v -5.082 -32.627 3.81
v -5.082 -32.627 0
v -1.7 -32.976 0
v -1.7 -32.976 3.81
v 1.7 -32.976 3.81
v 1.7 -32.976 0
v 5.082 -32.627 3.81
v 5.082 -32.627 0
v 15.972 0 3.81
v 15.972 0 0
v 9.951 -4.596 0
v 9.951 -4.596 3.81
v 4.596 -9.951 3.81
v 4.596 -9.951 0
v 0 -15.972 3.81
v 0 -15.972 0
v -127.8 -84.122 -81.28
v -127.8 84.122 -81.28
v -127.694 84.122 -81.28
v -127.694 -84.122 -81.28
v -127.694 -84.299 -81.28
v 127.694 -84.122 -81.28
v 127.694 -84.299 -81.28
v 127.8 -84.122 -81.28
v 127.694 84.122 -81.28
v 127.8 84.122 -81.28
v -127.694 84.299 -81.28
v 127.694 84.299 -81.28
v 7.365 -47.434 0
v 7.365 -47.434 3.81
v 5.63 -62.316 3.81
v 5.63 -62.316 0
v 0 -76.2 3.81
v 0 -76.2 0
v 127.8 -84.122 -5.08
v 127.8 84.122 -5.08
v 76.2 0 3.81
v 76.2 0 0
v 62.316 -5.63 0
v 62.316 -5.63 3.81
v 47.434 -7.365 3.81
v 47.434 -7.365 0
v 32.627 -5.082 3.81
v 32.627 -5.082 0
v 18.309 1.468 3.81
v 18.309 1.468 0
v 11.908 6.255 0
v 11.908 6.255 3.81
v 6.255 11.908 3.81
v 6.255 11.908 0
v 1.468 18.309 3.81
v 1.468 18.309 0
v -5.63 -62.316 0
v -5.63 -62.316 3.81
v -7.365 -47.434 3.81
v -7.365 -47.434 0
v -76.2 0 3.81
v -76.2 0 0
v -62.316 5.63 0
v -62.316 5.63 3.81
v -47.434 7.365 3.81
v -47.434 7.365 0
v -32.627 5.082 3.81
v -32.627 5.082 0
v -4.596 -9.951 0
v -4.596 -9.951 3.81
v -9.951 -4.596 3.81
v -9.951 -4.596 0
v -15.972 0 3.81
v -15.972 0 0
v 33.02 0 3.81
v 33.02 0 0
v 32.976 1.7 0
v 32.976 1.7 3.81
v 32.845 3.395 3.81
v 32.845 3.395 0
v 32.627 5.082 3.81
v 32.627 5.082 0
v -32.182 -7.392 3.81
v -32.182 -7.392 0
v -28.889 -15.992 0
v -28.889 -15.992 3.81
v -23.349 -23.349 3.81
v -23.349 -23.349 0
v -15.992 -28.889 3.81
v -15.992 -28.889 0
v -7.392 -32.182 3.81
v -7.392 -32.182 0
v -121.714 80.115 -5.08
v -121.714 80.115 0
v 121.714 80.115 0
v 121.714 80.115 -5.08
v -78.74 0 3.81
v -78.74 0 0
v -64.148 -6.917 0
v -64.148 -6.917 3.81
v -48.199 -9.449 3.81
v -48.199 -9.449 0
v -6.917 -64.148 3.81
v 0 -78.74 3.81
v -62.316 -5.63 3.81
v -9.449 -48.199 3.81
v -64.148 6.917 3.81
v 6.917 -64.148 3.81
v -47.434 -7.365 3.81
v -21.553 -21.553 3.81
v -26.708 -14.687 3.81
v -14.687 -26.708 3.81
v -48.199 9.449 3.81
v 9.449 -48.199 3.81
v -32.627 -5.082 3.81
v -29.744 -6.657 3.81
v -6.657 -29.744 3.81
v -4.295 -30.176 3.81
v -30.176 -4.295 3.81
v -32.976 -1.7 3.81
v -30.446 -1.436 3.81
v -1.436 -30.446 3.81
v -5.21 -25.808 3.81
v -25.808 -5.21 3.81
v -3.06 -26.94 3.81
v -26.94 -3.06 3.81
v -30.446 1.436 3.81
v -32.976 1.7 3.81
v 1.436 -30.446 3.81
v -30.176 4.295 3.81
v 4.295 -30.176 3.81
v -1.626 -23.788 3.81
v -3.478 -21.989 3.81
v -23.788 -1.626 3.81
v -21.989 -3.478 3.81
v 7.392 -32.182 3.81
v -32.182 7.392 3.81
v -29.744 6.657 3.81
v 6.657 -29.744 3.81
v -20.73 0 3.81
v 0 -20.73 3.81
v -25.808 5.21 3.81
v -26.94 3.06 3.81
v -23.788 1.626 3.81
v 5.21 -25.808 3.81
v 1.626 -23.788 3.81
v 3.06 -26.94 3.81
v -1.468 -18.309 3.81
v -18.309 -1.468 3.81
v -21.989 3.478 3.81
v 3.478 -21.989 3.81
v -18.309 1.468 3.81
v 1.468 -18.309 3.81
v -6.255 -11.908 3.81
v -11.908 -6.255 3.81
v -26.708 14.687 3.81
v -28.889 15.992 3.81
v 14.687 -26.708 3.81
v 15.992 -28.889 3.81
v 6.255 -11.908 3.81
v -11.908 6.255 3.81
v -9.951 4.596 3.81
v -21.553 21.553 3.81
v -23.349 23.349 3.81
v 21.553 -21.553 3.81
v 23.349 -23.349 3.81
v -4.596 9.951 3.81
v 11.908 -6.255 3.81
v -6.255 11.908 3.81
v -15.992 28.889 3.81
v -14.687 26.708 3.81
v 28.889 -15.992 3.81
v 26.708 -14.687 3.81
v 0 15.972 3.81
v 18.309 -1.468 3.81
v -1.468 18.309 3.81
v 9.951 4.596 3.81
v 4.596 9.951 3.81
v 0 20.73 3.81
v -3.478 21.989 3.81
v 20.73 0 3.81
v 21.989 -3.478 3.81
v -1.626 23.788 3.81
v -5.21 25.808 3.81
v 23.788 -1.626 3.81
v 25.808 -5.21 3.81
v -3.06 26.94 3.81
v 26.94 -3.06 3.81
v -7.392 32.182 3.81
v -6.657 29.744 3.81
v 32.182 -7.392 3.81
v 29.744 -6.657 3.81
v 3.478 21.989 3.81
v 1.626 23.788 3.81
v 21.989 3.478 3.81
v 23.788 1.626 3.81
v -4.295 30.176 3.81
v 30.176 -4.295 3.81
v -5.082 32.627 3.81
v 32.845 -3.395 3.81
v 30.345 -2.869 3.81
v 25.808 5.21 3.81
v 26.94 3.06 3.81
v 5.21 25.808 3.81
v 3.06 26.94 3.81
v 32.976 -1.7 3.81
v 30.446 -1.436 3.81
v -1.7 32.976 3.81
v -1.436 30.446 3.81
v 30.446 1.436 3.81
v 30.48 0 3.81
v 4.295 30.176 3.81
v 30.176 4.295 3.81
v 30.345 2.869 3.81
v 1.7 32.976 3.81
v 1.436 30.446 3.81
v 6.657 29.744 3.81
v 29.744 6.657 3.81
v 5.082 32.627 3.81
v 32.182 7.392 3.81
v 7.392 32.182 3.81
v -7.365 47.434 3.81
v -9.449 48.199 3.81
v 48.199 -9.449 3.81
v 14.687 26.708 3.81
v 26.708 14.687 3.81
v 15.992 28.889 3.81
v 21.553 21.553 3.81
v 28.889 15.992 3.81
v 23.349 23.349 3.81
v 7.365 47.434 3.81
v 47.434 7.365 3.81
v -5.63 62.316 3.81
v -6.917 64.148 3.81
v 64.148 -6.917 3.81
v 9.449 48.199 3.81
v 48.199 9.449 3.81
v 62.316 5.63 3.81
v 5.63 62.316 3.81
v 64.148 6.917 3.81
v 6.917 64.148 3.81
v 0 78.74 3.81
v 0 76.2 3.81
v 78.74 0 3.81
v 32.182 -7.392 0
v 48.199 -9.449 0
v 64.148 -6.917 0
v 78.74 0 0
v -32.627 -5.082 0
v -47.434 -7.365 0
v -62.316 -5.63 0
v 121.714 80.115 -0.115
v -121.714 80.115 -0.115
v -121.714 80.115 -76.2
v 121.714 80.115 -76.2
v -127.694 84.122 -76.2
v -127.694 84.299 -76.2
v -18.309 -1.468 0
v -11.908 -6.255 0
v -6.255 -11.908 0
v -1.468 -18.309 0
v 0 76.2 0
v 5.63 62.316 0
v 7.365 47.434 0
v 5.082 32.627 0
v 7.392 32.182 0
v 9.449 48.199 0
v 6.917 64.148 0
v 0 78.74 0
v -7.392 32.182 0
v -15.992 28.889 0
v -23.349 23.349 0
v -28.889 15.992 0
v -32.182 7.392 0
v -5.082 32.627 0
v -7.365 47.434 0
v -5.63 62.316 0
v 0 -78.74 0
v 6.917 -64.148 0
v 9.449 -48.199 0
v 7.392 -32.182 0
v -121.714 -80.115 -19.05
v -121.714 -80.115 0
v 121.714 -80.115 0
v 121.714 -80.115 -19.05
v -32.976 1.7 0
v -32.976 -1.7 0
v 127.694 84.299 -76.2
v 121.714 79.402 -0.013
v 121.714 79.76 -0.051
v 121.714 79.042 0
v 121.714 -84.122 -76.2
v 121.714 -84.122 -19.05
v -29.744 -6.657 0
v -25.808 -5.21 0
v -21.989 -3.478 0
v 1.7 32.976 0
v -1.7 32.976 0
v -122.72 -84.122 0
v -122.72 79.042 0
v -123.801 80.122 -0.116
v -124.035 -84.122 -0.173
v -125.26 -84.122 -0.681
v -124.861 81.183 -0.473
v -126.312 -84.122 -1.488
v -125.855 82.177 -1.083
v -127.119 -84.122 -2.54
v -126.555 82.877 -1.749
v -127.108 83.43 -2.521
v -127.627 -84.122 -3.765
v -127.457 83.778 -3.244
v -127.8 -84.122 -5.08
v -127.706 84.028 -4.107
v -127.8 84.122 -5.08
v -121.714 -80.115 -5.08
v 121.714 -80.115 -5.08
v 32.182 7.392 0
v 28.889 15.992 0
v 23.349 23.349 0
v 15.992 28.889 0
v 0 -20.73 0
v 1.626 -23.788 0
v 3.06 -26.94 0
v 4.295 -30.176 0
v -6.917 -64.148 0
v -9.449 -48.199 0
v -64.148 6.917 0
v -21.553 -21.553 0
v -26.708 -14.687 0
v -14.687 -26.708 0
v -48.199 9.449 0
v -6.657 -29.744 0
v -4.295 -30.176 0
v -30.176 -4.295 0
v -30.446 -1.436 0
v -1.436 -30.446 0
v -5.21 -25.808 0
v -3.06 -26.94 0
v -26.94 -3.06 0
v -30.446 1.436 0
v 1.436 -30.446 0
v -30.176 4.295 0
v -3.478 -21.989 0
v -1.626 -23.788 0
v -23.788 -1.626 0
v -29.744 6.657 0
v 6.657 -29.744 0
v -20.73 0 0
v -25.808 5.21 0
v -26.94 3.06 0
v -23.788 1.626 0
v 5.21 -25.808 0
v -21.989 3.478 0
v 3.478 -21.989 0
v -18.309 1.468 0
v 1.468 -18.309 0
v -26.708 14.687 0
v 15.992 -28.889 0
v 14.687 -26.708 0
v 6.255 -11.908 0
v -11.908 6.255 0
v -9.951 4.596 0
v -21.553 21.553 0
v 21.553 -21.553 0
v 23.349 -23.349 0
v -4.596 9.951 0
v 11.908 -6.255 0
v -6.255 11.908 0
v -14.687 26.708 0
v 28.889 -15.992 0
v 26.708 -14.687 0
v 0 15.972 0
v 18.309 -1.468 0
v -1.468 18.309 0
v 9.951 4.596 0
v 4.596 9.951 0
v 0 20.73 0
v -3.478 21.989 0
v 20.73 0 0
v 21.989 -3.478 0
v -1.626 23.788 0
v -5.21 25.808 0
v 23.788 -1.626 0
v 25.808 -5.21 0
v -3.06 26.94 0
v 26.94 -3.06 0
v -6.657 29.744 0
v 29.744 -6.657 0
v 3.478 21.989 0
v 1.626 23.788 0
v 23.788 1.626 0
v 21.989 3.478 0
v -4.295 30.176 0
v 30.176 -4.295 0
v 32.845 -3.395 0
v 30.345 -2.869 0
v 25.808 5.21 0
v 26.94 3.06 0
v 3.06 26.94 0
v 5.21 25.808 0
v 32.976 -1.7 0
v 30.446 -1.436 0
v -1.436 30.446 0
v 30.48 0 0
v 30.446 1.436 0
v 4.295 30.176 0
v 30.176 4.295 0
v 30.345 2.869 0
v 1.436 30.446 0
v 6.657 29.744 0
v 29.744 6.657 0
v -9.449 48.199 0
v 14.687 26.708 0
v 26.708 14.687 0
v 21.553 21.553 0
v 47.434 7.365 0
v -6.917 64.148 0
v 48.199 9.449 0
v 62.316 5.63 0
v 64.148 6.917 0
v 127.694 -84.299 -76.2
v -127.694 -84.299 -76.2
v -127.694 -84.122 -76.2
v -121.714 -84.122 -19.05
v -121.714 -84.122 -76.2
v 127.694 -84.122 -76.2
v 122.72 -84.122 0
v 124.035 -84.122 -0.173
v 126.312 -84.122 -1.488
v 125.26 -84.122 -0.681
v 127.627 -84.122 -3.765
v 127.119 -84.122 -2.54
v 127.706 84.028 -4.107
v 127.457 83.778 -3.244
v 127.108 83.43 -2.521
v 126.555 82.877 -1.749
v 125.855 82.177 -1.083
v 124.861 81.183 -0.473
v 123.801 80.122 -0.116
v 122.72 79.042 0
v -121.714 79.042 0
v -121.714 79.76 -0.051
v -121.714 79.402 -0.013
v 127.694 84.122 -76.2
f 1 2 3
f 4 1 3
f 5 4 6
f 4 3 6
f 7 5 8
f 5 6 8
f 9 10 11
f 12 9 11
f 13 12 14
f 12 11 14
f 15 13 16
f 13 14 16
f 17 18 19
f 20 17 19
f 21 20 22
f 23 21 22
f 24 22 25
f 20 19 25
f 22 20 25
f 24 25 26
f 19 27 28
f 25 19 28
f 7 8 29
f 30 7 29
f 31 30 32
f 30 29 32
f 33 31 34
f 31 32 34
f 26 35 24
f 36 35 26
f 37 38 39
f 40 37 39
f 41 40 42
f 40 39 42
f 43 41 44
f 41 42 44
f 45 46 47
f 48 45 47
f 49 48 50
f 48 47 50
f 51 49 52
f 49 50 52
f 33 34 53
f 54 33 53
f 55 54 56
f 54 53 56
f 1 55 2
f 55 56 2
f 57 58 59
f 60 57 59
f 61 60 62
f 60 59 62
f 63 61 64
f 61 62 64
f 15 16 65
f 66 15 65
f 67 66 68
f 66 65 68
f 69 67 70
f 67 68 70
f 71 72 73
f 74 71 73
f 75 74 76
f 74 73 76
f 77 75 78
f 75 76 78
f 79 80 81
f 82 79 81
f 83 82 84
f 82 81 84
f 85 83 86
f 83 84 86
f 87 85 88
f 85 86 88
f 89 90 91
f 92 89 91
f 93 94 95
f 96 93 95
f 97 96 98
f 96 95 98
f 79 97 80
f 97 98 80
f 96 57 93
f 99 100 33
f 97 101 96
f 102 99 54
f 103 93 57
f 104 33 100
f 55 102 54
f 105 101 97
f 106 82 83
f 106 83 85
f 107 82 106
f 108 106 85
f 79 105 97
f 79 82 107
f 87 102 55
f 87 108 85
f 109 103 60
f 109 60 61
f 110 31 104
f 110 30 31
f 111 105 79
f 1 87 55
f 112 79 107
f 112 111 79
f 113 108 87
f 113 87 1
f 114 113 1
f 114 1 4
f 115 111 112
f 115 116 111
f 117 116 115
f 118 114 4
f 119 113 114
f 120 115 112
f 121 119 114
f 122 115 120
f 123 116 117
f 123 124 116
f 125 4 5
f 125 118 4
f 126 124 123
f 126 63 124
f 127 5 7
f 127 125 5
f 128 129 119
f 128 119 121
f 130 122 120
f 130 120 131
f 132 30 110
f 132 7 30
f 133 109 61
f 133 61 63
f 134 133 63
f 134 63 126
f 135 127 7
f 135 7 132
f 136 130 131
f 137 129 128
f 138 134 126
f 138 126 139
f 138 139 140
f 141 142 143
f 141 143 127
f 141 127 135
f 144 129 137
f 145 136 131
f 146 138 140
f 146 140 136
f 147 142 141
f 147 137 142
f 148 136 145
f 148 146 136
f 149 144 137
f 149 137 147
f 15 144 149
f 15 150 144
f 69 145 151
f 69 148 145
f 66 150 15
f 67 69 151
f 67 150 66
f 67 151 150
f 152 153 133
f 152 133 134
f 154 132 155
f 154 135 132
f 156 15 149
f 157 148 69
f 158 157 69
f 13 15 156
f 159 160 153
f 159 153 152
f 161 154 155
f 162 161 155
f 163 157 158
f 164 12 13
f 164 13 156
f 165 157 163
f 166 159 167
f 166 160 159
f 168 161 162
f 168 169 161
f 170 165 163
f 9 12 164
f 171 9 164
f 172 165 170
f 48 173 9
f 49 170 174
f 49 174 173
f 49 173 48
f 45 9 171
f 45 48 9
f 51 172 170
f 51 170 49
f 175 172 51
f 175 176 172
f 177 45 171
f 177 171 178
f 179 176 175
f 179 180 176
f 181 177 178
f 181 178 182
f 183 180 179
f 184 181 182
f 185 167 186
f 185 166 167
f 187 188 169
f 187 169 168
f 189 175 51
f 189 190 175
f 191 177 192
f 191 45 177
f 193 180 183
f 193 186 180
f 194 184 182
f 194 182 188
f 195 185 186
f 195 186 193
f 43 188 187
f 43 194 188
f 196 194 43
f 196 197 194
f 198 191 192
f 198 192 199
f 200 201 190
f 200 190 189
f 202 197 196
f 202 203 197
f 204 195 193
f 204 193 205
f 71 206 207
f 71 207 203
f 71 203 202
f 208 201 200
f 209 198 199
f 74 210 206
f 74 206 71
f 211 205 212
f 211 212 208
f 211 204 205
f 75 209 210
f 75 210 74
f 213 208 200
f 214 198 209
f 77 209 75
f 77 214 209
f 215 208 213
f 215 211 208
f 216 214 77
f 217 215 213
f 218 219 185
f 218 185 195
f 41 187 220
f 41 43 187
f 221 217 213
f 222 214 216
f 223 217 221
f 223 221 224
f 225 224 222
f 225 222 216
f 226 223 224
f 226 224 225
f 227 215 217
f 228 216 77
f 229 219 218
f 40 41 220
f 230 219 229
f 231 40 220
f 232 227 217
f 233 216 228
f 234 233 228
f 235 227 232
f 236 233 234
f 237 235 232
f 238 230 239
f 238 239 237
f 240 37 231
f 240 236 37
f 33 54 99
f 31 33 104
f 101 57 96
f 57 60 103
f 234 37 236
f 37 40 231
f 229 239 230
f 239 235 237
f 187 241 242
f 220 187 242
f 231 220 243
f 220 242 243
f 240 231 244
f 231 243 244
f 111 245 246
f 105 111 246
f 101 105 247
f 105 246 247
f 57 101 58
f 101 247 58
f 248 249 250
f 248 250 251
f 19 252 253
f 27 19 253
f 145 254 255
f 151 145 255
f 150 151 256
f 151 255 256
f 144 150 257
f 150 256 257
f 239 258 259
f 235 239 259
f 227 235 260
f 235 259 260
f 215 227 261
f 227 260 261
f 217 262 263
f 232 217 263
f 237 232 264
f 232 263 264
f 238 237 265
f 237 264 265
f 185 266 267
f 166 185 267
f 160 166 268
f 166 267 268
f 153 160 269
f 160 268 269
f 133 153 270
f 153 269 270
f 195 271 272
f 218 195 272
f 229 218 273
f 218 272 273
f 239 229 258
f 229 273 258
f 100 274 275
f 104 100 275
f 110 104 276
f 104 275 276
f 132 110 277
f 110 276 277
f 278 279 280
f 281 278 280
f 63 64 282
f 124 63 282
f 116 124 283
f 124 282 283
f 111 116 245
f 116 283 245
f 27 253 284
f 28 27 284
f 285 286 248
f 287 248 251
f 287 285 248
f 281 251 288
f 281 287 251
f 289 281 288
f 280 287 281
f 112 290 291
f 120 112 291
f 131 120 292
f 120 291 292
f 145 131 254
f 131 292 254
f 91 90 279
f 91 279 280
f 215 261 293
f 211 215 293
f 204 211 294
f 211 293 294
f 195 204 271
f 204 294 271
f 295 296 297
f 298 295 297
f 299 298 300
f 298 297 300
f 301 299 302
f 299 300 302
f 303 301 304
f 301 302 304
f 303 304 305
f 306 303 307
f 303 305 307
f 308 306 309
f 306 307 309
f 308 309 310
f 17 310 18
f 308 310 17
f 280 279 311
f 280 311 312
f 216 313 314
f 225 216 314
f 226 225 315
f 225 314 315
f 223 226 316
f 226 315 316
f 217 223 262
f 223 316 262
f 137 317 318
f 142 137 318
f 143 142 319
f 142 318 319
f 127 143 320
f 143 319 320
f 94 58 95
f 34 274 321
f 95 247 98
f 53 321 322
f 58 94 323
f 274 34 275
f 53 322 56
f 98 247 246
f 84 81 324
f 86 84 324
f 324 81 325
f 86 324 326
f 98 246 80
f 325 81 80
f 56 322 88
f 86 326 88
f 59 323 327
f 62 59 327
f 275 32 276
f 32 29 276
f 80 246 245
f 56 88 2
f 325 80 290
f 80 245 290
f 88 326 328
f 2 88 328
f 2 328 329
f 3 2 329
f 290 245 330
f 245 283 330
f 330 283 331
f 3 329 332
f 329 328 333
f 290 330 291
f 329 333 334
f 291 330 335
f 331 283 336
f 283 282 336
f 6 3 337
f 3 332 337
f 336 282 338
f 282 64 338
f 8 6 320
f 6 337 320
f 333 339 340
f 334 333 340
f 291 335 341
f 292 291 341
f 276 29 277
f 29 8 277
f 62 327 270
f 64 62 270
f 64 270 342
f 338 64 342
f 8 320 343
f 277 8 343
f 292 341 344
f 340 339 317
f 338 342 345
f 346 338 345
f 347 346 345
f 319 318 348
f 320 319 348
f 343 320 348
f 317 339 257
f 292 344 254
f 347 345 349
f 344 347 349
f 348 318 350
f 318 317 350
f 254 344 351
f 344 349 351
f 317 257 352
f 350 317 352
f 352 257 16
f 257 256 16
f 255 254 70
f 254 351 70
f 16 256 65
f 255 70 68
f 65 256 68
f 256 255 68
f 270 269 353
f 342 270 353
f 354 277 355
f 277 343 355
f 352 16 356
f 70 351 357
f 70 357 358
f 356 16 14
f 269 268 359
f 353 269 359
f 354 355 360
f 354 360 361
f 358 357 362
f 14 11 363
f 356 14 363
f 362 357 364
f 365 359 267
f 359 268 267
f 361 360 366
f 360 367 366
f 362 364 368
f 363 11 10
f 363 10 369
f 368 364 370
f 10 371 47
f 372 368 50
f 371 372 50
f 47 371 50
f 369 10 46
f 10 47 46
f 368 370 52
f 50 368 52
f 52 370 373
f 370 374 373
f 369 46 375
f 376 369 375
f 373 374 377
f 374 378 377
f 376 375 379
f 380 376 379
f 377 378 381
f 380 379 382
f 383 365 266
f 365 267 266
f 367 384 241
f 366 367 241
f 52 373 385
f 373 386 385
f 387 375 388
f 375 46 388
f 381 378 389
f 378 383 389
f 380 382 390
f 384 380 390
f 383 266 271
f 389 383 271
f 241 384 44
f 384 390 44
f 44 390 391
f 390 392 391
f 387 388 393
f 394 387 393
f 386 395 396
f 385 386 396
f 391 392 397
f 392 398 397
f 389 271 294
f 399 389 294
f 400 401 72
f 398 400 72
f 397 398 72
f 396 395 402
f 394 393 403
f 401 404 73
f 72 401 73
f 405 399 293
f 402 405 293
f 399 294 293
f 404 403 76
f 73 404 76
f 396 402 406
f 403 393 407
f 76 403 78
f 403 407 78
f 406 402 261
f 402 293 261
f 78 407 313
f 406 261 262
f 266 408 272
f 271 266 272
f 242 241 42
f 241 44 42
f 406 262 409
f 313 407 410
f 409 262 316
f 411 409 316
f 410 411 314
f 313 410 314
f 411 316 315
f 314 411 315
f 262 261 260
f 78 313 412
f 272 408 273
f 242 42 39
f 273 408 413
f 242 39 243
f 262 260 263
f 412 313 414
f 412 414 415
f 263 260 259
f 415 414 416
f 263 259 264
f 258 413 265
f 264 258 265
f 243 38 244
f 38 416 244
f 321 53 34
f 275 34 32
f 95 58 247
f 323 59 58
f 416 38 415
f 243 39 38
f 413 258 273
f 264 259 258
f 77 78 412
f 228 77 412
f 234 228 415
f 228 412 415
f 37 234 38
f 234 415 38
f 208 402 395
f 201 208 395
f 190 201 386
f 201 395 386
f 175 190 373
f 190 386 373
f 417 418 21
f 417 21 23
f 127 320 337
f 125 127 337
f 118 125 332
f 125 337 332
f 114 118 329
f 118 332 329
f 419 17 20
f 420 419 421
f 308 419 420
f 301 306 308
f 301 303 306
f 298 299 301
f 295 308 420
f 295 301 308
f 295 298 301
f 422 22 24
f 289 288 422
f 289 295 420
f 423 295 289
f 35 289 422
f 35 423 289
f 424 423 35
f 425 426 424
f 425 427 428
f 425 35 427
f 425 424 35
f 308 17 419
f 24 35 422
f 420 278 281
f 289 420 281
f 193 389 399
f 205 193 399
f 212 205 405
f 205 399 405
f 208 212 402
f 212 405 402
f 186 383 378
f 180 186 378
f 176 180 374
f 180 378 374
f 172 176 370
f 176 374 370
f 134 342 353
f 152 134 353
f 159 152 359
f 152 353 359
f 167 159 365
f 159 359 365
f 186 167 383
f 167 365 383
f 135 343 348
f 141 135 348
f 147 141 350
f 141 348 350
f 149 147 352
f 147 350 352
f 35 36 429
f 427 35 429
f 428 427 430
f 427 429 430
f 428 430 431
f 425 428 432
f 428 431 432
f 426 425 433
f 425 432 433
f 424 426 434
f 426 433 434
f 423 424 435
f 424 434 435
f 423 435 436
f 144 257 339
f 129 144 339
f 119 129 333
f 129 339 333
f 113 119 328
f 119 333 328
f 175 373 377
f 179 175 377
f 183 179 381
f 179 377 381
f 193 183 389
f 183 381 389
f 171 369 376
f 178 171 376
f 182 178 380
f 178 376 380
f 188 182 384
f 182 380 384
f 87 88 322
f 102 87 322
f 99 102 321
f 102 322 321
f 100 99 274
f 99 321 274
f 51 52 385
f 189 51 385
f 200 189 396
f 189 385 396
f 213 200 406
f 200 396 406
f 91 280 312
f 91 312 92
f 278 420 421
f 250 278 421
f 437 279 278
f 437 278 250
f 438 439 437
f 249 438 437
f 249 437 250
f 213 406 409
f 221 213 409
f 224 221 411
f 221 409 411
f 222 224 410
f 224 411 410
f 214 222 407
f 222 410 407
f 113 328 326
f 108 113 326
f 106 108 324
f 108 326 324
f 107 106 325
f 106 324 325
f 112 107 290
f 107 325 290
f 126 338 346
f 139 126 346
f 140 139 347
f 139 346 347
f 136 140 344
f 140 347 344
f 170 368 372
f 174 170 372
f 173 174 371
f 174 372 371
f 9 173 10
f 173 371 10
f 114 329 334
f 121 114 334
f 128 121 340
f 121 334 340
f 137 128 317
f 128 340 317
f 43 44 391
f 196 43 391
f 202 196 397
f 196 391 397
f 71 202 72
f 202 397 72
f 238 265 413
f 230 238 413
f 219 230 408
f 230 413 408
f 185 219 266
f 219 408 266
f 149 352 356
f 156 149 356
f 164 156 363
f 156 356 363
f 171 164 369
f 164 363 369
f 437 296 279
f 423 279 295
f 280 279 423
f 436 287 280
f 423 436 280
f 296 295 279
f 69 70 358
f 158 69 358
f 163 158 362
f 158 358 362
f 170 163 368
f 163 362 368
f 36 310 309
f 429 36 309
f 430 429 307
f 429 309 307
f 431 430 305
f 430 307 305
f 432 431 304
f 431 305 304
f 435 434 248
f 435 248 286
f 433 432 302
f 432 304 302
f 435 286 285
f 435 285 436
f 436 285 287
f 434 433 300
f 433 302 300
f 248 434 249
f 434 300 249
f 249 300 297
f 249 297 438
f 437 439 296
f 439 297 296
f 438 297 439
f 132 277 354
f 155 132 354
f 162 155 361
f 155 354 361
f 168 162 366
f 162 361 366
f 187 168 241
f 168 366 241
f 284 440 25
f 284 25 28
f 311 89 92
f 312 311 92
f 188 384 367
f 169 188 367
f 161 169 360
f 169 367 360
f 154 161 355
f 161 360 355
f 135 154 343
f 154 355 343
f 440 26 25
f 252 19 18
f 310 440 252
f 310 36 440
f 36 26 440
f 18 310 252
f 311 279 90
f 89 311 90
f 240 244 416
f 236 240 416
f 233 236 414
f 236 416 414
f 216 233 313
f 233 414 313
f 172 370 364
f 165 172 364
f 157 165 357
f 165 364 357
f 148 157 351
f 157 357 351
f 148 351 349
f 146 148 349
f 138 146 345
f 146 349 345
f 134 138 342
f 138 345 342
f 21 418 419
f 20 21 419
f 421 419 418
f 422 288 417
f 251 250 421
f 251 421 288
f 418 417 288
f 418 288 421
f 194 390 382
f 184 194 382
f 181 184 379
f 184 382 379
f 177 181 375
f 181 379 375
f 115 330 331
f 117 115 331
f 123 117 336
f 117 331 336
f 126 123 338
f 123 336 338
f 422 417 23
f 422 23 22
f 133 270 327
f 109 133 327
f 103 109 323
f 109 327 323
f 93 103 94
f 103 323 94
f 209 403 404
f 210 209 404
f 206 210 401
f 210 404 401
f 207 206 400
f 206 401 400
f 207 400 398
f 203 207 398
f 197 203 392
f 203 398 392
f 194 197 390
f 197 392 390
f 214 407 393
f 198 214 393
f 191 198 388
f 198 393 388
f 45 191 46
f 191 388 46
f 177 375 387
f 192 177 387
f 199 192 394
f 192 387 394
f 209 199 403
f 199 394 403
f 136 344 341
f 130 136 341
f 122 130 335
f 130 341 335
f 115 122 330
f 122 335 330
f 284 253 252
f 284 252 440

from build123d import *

# Parameters (mm, degrees)
F1_DEPTH    = 3.81
F8_DEPTH    = 81.28
F2_W        = 243.4270217588
F2_H        = 4.0062579512
F5_DEPTH    = 19.05
F2_H_2      = 160.2307879926
F6_DEPTH    = 5.08
F4_W        = 255.387352037
F4_H        = 168.597304807
F9_DEPTH    = 5.08
F7_T1_DEPTH = 193.643303895
F7_T3_DEPTH = 280.9998563766


# Not quite as in the source:
# - a fillet or chamfer that OpenCascade refuses, or shapes differently, is made with other operations: its cross-section is extruded or revolved along the edge and cut away or added


with BuildPart() as f1:
    # F0 (on Top) → F1 (new body)
    with BuildSketch(Plane.XY):
        with BuildLine():
            ThreePointArc((7.3915821042, -32.1820588837), (23.3486659148, -23.3486659148), (32.1820588837, -7.3915821042))
            ThreePointArc((32.1820588837, -7.3915821042), (30.9590231559, -7.0377991533), (29.7442225234, -6.6566978658))
            ThreePointArc((29.7442225234, -6.6566978658), (21.5526146906, -21.5526146906), (6.6566978658, -29.7442225234))
            ThreePointArc((6.6566978658, -29.7442225234), (7.0377991533, -30.9590231559), (7.3915821042, -32.1820588837))
        make_face()
        with BuildLine():
            ThreePointArc((29.7442225234, -6.6566978658), (30.9590231559, -7.0377991533), (32.1820588837, -7.3915821042))
            ThreePointArc((32.1820588837, -7.3915821042), (32.4249296069, -6.2405400398), (32.6266451411, -5.0815771994))
            ThreePointArc((32.6266451411, -5.0815771994), (31.3967387773, -4.7023200855), (30.1759000362, -4.294817459))
            ThreePointArc((30.1759000362, -4.294817459), (29.9833268944, -5.4800098856), (29.7442225234, -6.6566978658))
        make_face()
        with BuildLine():
            ThreePointArc((33.02, 0), (32.9215144135, 2.5483894364), (32.6266451411, 5.0815771994))
            ThreePointArc((32.6266451411, 5.0815771994), (31.3967387773, 4.7023200855), (30.1759000362, 4.294817459))
            ThreePointArc((30.1759000362, 4.294817459), (30.4038799588, 2.1527850447), (30.48, 0))
            ThreePointArc((30.48, 0), (30.4038799588, -2.1527850447), (30.1759000362, -4.294817459))
            ThreePointArc((30.1759000362, -4.294817459), (31.3967387773, -4.7023200855), (32.6266451411, -5.0815771994))
            ThreePointArc((32.6266451411, -5.0815771994), (32.9215144135, -2.5483894364), (33.02, 0))
        make_face()
        with BuildLine():
            ThreePointArc((78.74, 0), (56.263882639, 8.7527857998), (32.1820588837, 7.3915821042))
            ThreePointArc((32.1820588837, 7.3915821042), (32.4249296069, 6.2405400398), (32.6266451411, 5.0815771994))
            ThreePointArc((32.6266451411, 5.0815771994), (54.9332390521, 6.9989527596), (76.2, 0))
            ThreePointArc((76.2, 0), (54.9332390521, -6.9989527596), (32.6266451411, -5.0815771994))
            ThreePointArc((32.6266451411, -5.0815771994), (32.4249296069, -6.2405400398), (32.1820588837, -7.3915821042))
            ThreePointArc((32.1820588837, -7.3915821042), (56.263882639, -8.7527857998), (78.74, 0))
        make_face()
        with BuildLine():
            ThreePointArc((30.1759000362, -4.294817459), (25.3529421779, -2.367297562), (20.7299390728, 0))
            ThreePointArc((20.7299390728, 0), (19.5100699332, -0.7187762227), (18.3088168551, -1.4682500504))
            ThreePointArc((18.3088168551, -1.4682500504), (23.882724784, -4.3793997775), (29.7442225234, -6.6566978658))
            ThreePointArc((29.7442225234, -6.6566978658), (29.9833268944, -5.4800098856), (30.1759000362, -4.294817459))
        make_face()
        with BuildLine():
            ThreePointArc((30.1759000362, 4.294817459), (29.9833268944, 5.4800098856), (29.7442225234, 6.6566978658))
            ThreePointArc((29.7442225234, 6.6566978658), (23.882724784, 4.3793997775), (18.3088168551, 1.4682500504))
            ThreePointArc((18.3088168551, 1.4682500504), (19.5100699332, 0.7187762227), (20.7299390728, 0))
            ThreePointArc((20.7299390728, 0), (25.3529421779, 2.367297562), (30.1759000362, 4.294817459))
        make_face()
        with BuildLine():
            ThreePointArc((32.1820588837, 7.3915821042), (23.3486659148, 23.3486659148), (7.3915821042, 32.1820588837))
            ThreePointArc((7.3915821042, 32.1820588837), (7.0377991533, 30.9590231559), (6.6566978658, 29.7442225234))
            ThreePointArc((6.6566978658, 29.7442225234), (21.5526146906, 21.5526146906), (29.7442225234, 6.6566978658))
            ThreePointArc((29.7442225234, 6.6566978658), (30.9590231559, 7.0377991533), (32.1820588837, 7.3915821042))
        make_face()
        with BuildLine():
            ThreePointArc((32.6266451411, 5.0815771994), (32.4249296069, 6.2405400398), (32.1820588837, 7.3915821042))
            ThreePointArc((32.1820588837, 7.3915821042), (30.9590231559, 7.0377991533), (29.7442225234, 6.6566978658))
            ThreePointArc((29.7442225234, 6.6566978658), (29.9833268944, 5.4800098856), (30.1759000362, 4.294817459))
            ThreePointArc((30.1759000362, 4.294817459), (31.3967387773, 4.7023200855), (32.6266451411, 5.0815771994))
        make_face()
        with BuildLine():
            ThreePointArc((4.294817459, -30.1759000362), (5.4800098856, -29.9833268944), (6.6566978658, -29.7442225234))
            ThreePointArc((6.6566978658, -29.7442225234), (4.3793997775, -23.882724784), (1.4682500504, -18.3088168551))
            ThreePointArc((1.4682500504, -18.3088168551), (0.7187762227, -19.5100699332), (0, -20.7299390728))
            ThreePointArc((0, -20.7299390728), (2.367297562, -25.3529421779), (4.294817459, -30.1759000362))
        make_face()
        with BuildLine():
            ThreePointArc((-5.0815771994, -32.6266451411), (-6.2405400398, -32.4249296069), (-7.3915821042, -32.1820588837))
            ThreePointArc((-7.3915821042, -32.1820588837), (-8.7527857998, -56.263882639), (0, -78.74))
            ThreePointArc((0, -78.74), (8.7527857998, -56.263882639), (7.3915821042, -32.1820588837))
            ThreePointArc((7.3915821042, -32.1820588837), (6.2405400398, -32.4249296069), (5.0815771994, -32.6266451411))
            ThreePointArc((5.0815771994, -32.6266451411), (6.9989527596, -54.9332390521), (0, -76.2))
            ThreePointArc((0, -76.2), (-6.9989527596, -54.9332390521), (-5.0815771994, -32.6266451411))
        make_face()
        with BuildLine():
            ThreePointArc((-4.294817459, -30.1759000362), (-4.7023200855, -31.3967387773), (-5.0815771994, -32.6266451411))
            ThreePointArc((-5.0815771994, -32.6266451411), (0, -33.02), (5.0815771994, -32.6266451411))
            ThreePointArc((5.0815771994, -32.6266451411), (4.7023200855, -31.3967387773), (4.294817459, -30.1759000362))
            ThreePointArc((4.294817459, -30.1759000362), (0, -30.48), (-4.294817459, -30.1759000362))
        make_face()
        with BuildLine():
            ThreePointArc((5.0815771994, -32.6266451411), (6.2405400398, -32.4249296069), (7.3915821042, -32.1820588837))
            ThreePointArc((7.3915821042, -32.1820588837), (7.0377991533, -30.9590231559), (6.6566978658, -29.7442225234))
            ThreePointArc((6.6566978658, -29.7442225234), (5.4800098856, -29.9833268944), (4.294817459, -30.1759000362))
            ThreePointArc((4.294817459, -30.1759000362), (4.7023200855, -31.3967387773), (5.0815771994, -32.6266451411))
        make_face()
        with BuildLine():
            ThreePointArc((-6.6566978658, -29.7442225234), (-7.0377991533, -30.9590231559), (-7.3915821042, -32.1820588837))
            ThreePointArc((-7.3915821042, -32.1820588837), (-6.2405400398, -32.4249296069), (-5.0815771994, -32.6266451411))
            ThreePointArc((-5.0815771994, -32.6266451411), (-4.7023200855, -31.3967387773), (-4.294817459, -30.1759000362))
            ThreePointArc((-4.294817459, -30.1759000362), (-5.4800098856, -29.9833268944), (-6.6566978658, -29.7442225234))
        make_face()
        with BuildLine():
            ThreePointArc((-1.4682500504, -18.3088168551), (-4.3793997775, -23.882724784), (-6.6566978658, -29.7442225234))
            ThreePointArc((-6.6566978658, -29.7442225234), (-5.4800098856, -29.9833268944), (-4.294817459, -30.1759000362))
            ThreePointArc((-4.294817459, -30.1759000362), (-2.367297562, -25.3529421779), (0, -20.7299390728))
            ThreePointArc((0, -20.7299390728), (-0.7187762227, -19.5100699332), (-1.4682500504, -18.3088168551))
        make_face()
        with BuildLine():
            ThreePointArc((18.3088168551, -1.4682500504), (17.1314911064, -0.7483168971), (15.9719991981, 0))
            ThreePointArc((15.9719991981, 0), (7.1842048969, -7.1842048969), (0, -15.9719991981))
            ThreePointArc((0, -15.9719991981), (0.7483168971, -17.1314911064), (1.4682500504, -18.3088168551))
            ThreePointArc((1.4682500504, -18.3088168551), (8.9802561211, -8.9802561211), (18.3088168551, -1.4682500504))
        make_face()
        with BuildLine():
            ThreePointArc((18.3088168551, 1.4682500504), (8.9802561211, 8.9802561211), (1.4682500504, 18.3088168551))
            ThreePointArc((1.4682500504, 18.3088168551), (0.7483168971, 17.1314911064), (0, 15.9719991981))
            ThreePointArc((0, 15.9719991981), (7.1842048969, 7.1842048969), (15.9719991981, 0))
            ThreePointArc((15.9719991981, 0), (17.1314911064, 0.7483168971), (18.3088168551, 1.4682500504))
        make_face()
        with BuildLine():
            ThreePointArc((0, 15.9719991981), (-0.7483168971, 17.1314911064), (-1.4682500504, 18.3088168551))
            ThreePointArc((-1.4682500504, 18.3088168551), (-8.9802561211, 8.9802561211), (-18.3088168551, 1.4682500504))
            ThreePointArc((-18.3088168551, 1.4682500504), (-17.1314911064, 0.7483168971), (-15.9719991981, 0))
            ThreePointArc((-15.9719991981, 0), (-7.1842048969, 7.1842048969), (0, 15.9719991981))
        make_face()
        with BuildLine():
            ThreePointArc((0, -15.9719991981), (-7.1842048969, -7.1842048969), (-15.9719991981, 0))
            ThreePointArc((-15.9719991981, 0), (-17.1314911064, -0.7483168971), (-18.3088168551, -1.4682500504))
            ThreePointArc((-18.3088168551, -1.4682500504), (-8.9802561211, -8.9802561211), (-1.4682500504, -18.3088168551))
            ThreePointArc((-1.4682500504, -18.3088168551), (-0.7483168971, -17.1314911064), (0, -15.9719991981))
        make_face()
        with BuildLine():
            ThreePointArc((-18.3088168551, 1.4682500504), (-23.882724784, 4.3793997775), (-29.7442225234, 6.6566978658))
            ThreePointArc((-29.7442225234, 6.6566978658), (-29.9833268944, 5.4800098856), (-30.1759000362, 4.294817459))
            ThreePointArc((-30.1759000362, 4.294817459), (-25.3529421779, 2.367297562), (-20.7299390728, 0))
            ThreePointArc((-20.7299390728, 0), (-19.5100699332, 0.7187762227), (-18.3088168551, 1.4682500504))
        make_face()
        with BuildLine():
            ThreePointArc((-18.3088168551, -1.4682500504), (-19.5100699332, -0.7187762227), (-20.7299390728, 0))
            ThreePointArc((-20.7299390728, 0), (-25.3529421779, -2.367297562), (-30.1759000362, -4.294817459))
            ThreePointArc((-30.1759000362, -4.294817459), (-29.9833268944, -5.4800098856), (-29.7442225234, -6.6566978658))
            ThreePointArc((-29.7442225234, -6.6566978658), (-23.882724784, -4.3793997775), (-18.3088168551, -1.4682500504))
        make_face()
        with BuildLine():
            ThreePointArc((-30.1759000362, 4.294817459), (-31.3967387773, 4.7023200855), (-32.6266451411, 5.0815771994))
            ThreePointArc((-32.6266451411, 5.0815771994), (-33.02, 0), (-32.6266451411, -5.0815771994))
            ThreePointArc((-32.6266451411, -5.0815771994), (-31.3967387773, -4.7023200855), (-30.1759000362, -4.294817459))
            ThreePointArc((-30.1759000362, -4.294817459), (-30.48, 0), (-30.1759000362, 4.294817459))
        make_face()
        with BuildLine():
            ThreePointArc((-32.6266451411, -5.0815771994), (-32.4249296069, -6.2405400398), (-32.1820588837, -7.3915821042))
            ThreePointArc((-32.1820588837, -7.3915821042), (-30.9590231559, -7.0377991533), (-29.7442225234, -6.6566978658))
            ThreePointArc((-29.7442225234, -6.6566978658), (-29.9833268944, -5.4800098856), (-30.1759000362, -4.294817459))
            ThreePointArc((-30.1759000362, -4.294817459), (-31.3967387773, -4.7023200855), (-32.6266451411, -5.0815771994))
        make_face()
        with BuildLine():
            ThreePointArc((-29.7442225234, -6.6566978658), (-30.9590231559, -7.0377991533), (-32.1820588837, -7.3915821042))
            ThreePointArc((-32.1820588837, -7.3915821042), (-23.3486659148, -23.3486659148), (-7.3915821042, -32.1820588837))
            ThreePointArc((-7.3915821042, -32.1820588837), (-7.0377991533, -30.9590231559), (-6.6566978658, -29.7442225234))
            ThreePointArc((-6.6566978658, -29.7442225234), (-21.5526146906, -21.5526146906), (-29.7442225234, -6.6566978658))
        make_face()
        with BuildLine():
            ThreePointArc((-29.7442225234, 6.6566978658), (-30.9590231559, 7.0377991533), (-32.1820588837, 7.3915821042))
            ThreePointArc((-32.1820588837, 7.3915821042), (-32.4249296069, 6.2405400398), (-32.6266451411, 5.0815771994))
            ThreePointArc((-32.6266451411, 5.0815771994), (-31.3967387773, 4.7023200855), (-30.1759000362, 4.294817459))
            ThreePointArc((-30.1759000362, 4.294817459), (-29.9833268944, 5.4800098856), (-29.7442225234, 6.6566978658))
        make_face()
        with BuildLine():
            ThreePointArc((-32.6266451411, 5.0815771994), (-32.4249296069, 6.2405400398), (-32.1820588837, 7.3915821042))
            ThreePointArc((-32.1820588837, 7.3915821042), (-56.263882639, 8.7527857998), (-78.74, 0))
            ThreePointArc((-78.74, 0), (-56.263882639, -8.7527857998), (-32.1820588837, -7.3915821042))
            ThreePointArc((-32.1820588837, -7.3915821042), (-32.4249296069, -6.2405400398), (-32.6266451411, -5.0815771994))
            ThreePointArc((-32.6266451411, -5.0815771994), (-54.9332390521, -6.9989527596), (-76.2, 0))
            ThreePointArc((-76.2, 0), (-54.9332390521, 6.9989527596), (-32.6266451411, 5.0815771994))
        make_face()
        with BuildLine():
            ThreePointArc((-6.6566978658, 29.7442225234), (-7.0377991533, 30.9590231559), (-7.3915821042, 32.1820588837))
            ThreePointArc((-7.3915821042, 32.1820588837), (-23.3486659148, 23.3486659148), (-32.1820588837, 7.3915821042))
            ThreePointArc((-32.1820588837, 7.3915821042), (-30.9590231559, 7.0377991533), (-29.7442225234, 6.6566978658))
            ThreePointArc((-29.7442225234, 6.6566978658), (-21.5526146906, 21.5526146906), (-6.6566978658, 29.7442225234))
        make_face()
        with BuildLine():
            ThreePointArc((0, 20.7299390728), (-2.367297562, 25.3529421779), (-4.294817459, 30.1759000362))
            ThreePointArc((-4.294817459, 30.1759000362), (-5.4800098856, 29.9833268944), (-6.6566978658, 29.7442225234))
            ThreePointArc((-6.6566978658, 29.7442225234), (-4.3793997775, 23.882724784), (-1.4682500504, 18.3088168551))
            ThreePointArc((-1.4682500504, 18.3088168551), (-0.7187762227, 19.5100699332), (0, 20.7299390728))
        make_face()
        with BuildLine():
            ThreePointArc((6.6566978658, 29.7442225234), (5.4800098856, 29.9833268944), (4.294817459, 30.1759000362))
            ThreePointArc((4.294817459, 30.1759000362), (2.367297562, 25.3529421779), (0, 20.7299390728))
            ThreePointArc((0, 20.7299390728), (0.7187762227, 19.5100699332), (1.4682500504, 18.3088168551))
            ThreePointArc((1.4682500504, 18.3088168551), (4.3793997775, 23.882724784), (6.6566978658, 29.7442225234))
        make_face()
        with BuildLine():
            ThreePointArc((5.0815771994, 32.6266451411), (0, 33.02), (-5.0815771994, 32.6266451411))
            ThreePointArc((-5.0815771994, 32.6266451411), (-4.7023200855, 31.3967387773), (-4.294817459, 30.1759000362))
            ThreePointArc((-4.294817459, 30.1759000362), (0, 30.48), (4.294817459, 30.1759000362))
            ThreePointArc((4.294817459, 30.1759000362), (4.7023200855, 31.3967387773), (5.0815771994, 32.6266451411))
        make_face()
        with BuildLine():
            ThreePointArc((-5.0815771994, 32.6266451411), (-6.9989527596, 54.9332390521), (0, 76.2))
            ThreePointArc((0, 76.2), (6.9989527596, 54.9332390521), (5.0815771994, 32.6266451411))
            ThreePointArc((5.0815771994, 32.6266451411), (6.2405400398, 32.4249296069), (7.3915821042, 32.1820588837))
            ThreePointArc((7.3915821042, 32.1820588837), (8.7527857998, 56.263882639), (0, 78.74))
            ThreePointArc((0, 78.74), (-8.7527857998, 56.263882639), (-7.3915821042, 32.1820588837))
            ThreePointArc((-7.3915821042, 32.1820588837), (-6.2405400398, 32.4249296069), (-5.0815771994, 32.6266451411))
        make_face()
        with BuildLine():
            ThreePointArc((7.3915821042, 32.1820588837), (6.2405400398, 32.4249296069), (5.0815771994, 32.6266451411))
            ThreePointArc((5.0815771994, 32.6266451411), (4.7023200855, 31.3967387773), (4.294817459, 30.1759000362))
            ThreePointArc((4.294817459, 30.1759000362), (5.4800098856, 29.9833268944), (6.6566978658, 29.7442225234))
            ThreePointArc((6.6566978658, 29.7442225234), (7.0377991533, 30.9590231559), (7.3915821042, 32.1820588837))
        make_face()
        with BuildLine():
            ThreePointArc((1.4682500504, 18.3088168551), (0.7187762227, 19.5100699332), (0, 20.7299390728))
            ThreePointArc((0, 20.7299390728), (-0.7187762227, 19.5100699332), (-1.4682500504, 18.3088168551))
            ThreePointArc((-1.4682500504, 18.3088168551), (-0.7483168971, 17.1314911064), (0, 15.9719991981))
            ThreePointArc((0, 15.9719991981), (0.7483168971, 17.1314911064), (1.4682500504, 18.3088168551))
        make_face()
        with BuildLine():
            ThreePointArc((-4.294817459, 30.1759000362), (-4.7023200855, 31.3967387773), (-5.0815771994, 32.6266451411))
            ThreePointArc((-5.0815771994, 32.6266451411), (-6.2405400398, 32.4249296069), (-7.3915821042, 32.1820588837))
            ThreePointArc((-7.3915821042, 32.1820588837), (-7.0377991533, 30.9590231559), (-6.6566978658, 29.7442225234))
            ThreePointArc((-6.6566978658, 29.7442225234), (-5.4800098856, 29.9833268944), (-4.294817459, 30.1759000362))
        make_face()
        with BuildLine():
            ThreePointArc((-15.9719991981, 0), (-17.1314911064, 0.7483168971), (-18.3088168551, 1.4682500504))
            ThreePointArc((-18.3088168551, 1.4682500504), (-19.5100699332, 0.7187762227), (-20.7299390728, 0))
            ThreePointArc((-20.7299390728, 0), (-19.5100699332, -0.7187762227), (-18.3088168551, -1.4682500504))
            ThreePointArc((-18.3088168551, -1.4682500504), (-17.1314911064, -0.7483168971), (-15.9719991981, 0))
        make_face()
        with BuildLine():
            ThreePointArc((1.4682500504, -18.3088168551), (0.7483168971, -17.1314911064), (0, -15.9719991981))
            ThreePointArc((0, -15.9719991981), (-0.7483168971, -17.1314911064), (-1.4682500504, -18.3088168551))
            ThreePointArc((-1.4682500504, -18.3088168551), (-0.7187762227, -19.5100699332), (0, -20.7299390728))
            ThreePointArc((0, -20.7299390728), (0.7187762227, -19.5100699332), (1.4682500504, -18.3088168551))
        make_face()
        with BuildLine():
            ThreePointArc((20.7299390728, 0), (19.5100699332, 0.7187762227), (18.3088168551, 1.4682500504))
            ThreePointArc((18.3088168551, 1.4682500504), (17.1314911064, 0.7483168971), (15.9719991981, 0))
            ThreePointArc((15.9719991981, 0), (17.1314911064, -0.7483168971), (18.3088168551, -1.4682500504))
            ThreePointArc((18.3088168551, -1.4682500504), (19.5100699332, -0.7187762227), (20.7299390728, 0))
        make_face()
    extrude(amount=F1_DEPTH)


with BuildPart() as f8:
    # F2 (on Top) → F8 (new body)
    with BuildSketch(Plane.XY):
        Polygon((127.7999281883, -84.1216519475), (127.7999281883, 84.1216519475), (-127.7999281883, 84.1216519475), (-127.7999281883, -84.1216519475), (-121.7135108794, -84.1216519475), (-121.7135108794, -80.1153939963), (-121.7135108794, 80.1153939963), (121.7135108794, 80.1153939963), (121.7135108794, -80.1153939963), (121.7135108794, -84.1216519475), align=None)
    extrude(amount=-F8_DEPTH)

    # F2 (on Top) → F5 (join)
    with BuildSketch(Plane.XY):
        with Locations((0, -82.1185229719)):
            Rectangle(F2_W, F2_H)
    extrude(amount=-F5_DEPTH)

    # F4 (on offset) → F9 (join)
    with BuildSketch(Plane.XY.offset(-76.2)):
        Rectangle(F4_W, F4_H)
    extrude(amount=-F9_DEPTH)

    # F7: fillet of radius 5.08 on 3 edges, made by hand

    # F7_s2 → F7_t1 (cut)
    with BuildSketch(Plane.XZ.offset(-96.8216519475)):
        with BuildLine():
            ThreePointArc((127.7999281883, -5.08), (126.3120306368, -1.4878975516), (122.7199281883, 0))
            Line((122.7199281883, 0), (127.7999281883, 0))
            Line((127.7999281883, 0), (127.7999281883, -5.08))
        make_face()
        with BuildLine():
            ThreePointArc((-122.7199281883, 0), (-126.3120306368, -1.4878975516), (-127.7999281883, -5.08))
            Line((-127.7999281883, -5.08), (-127.7999281883, 0))
            Line((-127.7999281883, 0), (-122.7199281883, 0))
        make_face()
    extrude(amount=F7_T1_DEPTH, mode=Mode.SUBTRACT)

    # F7_s4 → F7_t3 (cut)
    with BuildSketch(Plane.YZ.offset(-140.4999281883)):
        with BuildLine():
            ThreePointArc((84.1216519475, -5.08), (82.6337543959, -1.4878975516), (79.0416519475, 0))
            Line((79.0416519475, 0), (84.1216519475, 0))
            Line((84.1216519475, 0), (84.1216519475, -5.08))
        make_face()
    extrude(amount=F7_T3_DEPTH, mode=Mode.SUBTRACT)


with BuildPart() as f6:
    # F2 (on Top) → F6 (new body)
    with BuildSketch(Plane.XY):
        Rectangle(F2_W, F2_H_2)
    extrude(amount=-F6_DEPTH)


solid = Compound([f1.part, f8.part, f6.part])
